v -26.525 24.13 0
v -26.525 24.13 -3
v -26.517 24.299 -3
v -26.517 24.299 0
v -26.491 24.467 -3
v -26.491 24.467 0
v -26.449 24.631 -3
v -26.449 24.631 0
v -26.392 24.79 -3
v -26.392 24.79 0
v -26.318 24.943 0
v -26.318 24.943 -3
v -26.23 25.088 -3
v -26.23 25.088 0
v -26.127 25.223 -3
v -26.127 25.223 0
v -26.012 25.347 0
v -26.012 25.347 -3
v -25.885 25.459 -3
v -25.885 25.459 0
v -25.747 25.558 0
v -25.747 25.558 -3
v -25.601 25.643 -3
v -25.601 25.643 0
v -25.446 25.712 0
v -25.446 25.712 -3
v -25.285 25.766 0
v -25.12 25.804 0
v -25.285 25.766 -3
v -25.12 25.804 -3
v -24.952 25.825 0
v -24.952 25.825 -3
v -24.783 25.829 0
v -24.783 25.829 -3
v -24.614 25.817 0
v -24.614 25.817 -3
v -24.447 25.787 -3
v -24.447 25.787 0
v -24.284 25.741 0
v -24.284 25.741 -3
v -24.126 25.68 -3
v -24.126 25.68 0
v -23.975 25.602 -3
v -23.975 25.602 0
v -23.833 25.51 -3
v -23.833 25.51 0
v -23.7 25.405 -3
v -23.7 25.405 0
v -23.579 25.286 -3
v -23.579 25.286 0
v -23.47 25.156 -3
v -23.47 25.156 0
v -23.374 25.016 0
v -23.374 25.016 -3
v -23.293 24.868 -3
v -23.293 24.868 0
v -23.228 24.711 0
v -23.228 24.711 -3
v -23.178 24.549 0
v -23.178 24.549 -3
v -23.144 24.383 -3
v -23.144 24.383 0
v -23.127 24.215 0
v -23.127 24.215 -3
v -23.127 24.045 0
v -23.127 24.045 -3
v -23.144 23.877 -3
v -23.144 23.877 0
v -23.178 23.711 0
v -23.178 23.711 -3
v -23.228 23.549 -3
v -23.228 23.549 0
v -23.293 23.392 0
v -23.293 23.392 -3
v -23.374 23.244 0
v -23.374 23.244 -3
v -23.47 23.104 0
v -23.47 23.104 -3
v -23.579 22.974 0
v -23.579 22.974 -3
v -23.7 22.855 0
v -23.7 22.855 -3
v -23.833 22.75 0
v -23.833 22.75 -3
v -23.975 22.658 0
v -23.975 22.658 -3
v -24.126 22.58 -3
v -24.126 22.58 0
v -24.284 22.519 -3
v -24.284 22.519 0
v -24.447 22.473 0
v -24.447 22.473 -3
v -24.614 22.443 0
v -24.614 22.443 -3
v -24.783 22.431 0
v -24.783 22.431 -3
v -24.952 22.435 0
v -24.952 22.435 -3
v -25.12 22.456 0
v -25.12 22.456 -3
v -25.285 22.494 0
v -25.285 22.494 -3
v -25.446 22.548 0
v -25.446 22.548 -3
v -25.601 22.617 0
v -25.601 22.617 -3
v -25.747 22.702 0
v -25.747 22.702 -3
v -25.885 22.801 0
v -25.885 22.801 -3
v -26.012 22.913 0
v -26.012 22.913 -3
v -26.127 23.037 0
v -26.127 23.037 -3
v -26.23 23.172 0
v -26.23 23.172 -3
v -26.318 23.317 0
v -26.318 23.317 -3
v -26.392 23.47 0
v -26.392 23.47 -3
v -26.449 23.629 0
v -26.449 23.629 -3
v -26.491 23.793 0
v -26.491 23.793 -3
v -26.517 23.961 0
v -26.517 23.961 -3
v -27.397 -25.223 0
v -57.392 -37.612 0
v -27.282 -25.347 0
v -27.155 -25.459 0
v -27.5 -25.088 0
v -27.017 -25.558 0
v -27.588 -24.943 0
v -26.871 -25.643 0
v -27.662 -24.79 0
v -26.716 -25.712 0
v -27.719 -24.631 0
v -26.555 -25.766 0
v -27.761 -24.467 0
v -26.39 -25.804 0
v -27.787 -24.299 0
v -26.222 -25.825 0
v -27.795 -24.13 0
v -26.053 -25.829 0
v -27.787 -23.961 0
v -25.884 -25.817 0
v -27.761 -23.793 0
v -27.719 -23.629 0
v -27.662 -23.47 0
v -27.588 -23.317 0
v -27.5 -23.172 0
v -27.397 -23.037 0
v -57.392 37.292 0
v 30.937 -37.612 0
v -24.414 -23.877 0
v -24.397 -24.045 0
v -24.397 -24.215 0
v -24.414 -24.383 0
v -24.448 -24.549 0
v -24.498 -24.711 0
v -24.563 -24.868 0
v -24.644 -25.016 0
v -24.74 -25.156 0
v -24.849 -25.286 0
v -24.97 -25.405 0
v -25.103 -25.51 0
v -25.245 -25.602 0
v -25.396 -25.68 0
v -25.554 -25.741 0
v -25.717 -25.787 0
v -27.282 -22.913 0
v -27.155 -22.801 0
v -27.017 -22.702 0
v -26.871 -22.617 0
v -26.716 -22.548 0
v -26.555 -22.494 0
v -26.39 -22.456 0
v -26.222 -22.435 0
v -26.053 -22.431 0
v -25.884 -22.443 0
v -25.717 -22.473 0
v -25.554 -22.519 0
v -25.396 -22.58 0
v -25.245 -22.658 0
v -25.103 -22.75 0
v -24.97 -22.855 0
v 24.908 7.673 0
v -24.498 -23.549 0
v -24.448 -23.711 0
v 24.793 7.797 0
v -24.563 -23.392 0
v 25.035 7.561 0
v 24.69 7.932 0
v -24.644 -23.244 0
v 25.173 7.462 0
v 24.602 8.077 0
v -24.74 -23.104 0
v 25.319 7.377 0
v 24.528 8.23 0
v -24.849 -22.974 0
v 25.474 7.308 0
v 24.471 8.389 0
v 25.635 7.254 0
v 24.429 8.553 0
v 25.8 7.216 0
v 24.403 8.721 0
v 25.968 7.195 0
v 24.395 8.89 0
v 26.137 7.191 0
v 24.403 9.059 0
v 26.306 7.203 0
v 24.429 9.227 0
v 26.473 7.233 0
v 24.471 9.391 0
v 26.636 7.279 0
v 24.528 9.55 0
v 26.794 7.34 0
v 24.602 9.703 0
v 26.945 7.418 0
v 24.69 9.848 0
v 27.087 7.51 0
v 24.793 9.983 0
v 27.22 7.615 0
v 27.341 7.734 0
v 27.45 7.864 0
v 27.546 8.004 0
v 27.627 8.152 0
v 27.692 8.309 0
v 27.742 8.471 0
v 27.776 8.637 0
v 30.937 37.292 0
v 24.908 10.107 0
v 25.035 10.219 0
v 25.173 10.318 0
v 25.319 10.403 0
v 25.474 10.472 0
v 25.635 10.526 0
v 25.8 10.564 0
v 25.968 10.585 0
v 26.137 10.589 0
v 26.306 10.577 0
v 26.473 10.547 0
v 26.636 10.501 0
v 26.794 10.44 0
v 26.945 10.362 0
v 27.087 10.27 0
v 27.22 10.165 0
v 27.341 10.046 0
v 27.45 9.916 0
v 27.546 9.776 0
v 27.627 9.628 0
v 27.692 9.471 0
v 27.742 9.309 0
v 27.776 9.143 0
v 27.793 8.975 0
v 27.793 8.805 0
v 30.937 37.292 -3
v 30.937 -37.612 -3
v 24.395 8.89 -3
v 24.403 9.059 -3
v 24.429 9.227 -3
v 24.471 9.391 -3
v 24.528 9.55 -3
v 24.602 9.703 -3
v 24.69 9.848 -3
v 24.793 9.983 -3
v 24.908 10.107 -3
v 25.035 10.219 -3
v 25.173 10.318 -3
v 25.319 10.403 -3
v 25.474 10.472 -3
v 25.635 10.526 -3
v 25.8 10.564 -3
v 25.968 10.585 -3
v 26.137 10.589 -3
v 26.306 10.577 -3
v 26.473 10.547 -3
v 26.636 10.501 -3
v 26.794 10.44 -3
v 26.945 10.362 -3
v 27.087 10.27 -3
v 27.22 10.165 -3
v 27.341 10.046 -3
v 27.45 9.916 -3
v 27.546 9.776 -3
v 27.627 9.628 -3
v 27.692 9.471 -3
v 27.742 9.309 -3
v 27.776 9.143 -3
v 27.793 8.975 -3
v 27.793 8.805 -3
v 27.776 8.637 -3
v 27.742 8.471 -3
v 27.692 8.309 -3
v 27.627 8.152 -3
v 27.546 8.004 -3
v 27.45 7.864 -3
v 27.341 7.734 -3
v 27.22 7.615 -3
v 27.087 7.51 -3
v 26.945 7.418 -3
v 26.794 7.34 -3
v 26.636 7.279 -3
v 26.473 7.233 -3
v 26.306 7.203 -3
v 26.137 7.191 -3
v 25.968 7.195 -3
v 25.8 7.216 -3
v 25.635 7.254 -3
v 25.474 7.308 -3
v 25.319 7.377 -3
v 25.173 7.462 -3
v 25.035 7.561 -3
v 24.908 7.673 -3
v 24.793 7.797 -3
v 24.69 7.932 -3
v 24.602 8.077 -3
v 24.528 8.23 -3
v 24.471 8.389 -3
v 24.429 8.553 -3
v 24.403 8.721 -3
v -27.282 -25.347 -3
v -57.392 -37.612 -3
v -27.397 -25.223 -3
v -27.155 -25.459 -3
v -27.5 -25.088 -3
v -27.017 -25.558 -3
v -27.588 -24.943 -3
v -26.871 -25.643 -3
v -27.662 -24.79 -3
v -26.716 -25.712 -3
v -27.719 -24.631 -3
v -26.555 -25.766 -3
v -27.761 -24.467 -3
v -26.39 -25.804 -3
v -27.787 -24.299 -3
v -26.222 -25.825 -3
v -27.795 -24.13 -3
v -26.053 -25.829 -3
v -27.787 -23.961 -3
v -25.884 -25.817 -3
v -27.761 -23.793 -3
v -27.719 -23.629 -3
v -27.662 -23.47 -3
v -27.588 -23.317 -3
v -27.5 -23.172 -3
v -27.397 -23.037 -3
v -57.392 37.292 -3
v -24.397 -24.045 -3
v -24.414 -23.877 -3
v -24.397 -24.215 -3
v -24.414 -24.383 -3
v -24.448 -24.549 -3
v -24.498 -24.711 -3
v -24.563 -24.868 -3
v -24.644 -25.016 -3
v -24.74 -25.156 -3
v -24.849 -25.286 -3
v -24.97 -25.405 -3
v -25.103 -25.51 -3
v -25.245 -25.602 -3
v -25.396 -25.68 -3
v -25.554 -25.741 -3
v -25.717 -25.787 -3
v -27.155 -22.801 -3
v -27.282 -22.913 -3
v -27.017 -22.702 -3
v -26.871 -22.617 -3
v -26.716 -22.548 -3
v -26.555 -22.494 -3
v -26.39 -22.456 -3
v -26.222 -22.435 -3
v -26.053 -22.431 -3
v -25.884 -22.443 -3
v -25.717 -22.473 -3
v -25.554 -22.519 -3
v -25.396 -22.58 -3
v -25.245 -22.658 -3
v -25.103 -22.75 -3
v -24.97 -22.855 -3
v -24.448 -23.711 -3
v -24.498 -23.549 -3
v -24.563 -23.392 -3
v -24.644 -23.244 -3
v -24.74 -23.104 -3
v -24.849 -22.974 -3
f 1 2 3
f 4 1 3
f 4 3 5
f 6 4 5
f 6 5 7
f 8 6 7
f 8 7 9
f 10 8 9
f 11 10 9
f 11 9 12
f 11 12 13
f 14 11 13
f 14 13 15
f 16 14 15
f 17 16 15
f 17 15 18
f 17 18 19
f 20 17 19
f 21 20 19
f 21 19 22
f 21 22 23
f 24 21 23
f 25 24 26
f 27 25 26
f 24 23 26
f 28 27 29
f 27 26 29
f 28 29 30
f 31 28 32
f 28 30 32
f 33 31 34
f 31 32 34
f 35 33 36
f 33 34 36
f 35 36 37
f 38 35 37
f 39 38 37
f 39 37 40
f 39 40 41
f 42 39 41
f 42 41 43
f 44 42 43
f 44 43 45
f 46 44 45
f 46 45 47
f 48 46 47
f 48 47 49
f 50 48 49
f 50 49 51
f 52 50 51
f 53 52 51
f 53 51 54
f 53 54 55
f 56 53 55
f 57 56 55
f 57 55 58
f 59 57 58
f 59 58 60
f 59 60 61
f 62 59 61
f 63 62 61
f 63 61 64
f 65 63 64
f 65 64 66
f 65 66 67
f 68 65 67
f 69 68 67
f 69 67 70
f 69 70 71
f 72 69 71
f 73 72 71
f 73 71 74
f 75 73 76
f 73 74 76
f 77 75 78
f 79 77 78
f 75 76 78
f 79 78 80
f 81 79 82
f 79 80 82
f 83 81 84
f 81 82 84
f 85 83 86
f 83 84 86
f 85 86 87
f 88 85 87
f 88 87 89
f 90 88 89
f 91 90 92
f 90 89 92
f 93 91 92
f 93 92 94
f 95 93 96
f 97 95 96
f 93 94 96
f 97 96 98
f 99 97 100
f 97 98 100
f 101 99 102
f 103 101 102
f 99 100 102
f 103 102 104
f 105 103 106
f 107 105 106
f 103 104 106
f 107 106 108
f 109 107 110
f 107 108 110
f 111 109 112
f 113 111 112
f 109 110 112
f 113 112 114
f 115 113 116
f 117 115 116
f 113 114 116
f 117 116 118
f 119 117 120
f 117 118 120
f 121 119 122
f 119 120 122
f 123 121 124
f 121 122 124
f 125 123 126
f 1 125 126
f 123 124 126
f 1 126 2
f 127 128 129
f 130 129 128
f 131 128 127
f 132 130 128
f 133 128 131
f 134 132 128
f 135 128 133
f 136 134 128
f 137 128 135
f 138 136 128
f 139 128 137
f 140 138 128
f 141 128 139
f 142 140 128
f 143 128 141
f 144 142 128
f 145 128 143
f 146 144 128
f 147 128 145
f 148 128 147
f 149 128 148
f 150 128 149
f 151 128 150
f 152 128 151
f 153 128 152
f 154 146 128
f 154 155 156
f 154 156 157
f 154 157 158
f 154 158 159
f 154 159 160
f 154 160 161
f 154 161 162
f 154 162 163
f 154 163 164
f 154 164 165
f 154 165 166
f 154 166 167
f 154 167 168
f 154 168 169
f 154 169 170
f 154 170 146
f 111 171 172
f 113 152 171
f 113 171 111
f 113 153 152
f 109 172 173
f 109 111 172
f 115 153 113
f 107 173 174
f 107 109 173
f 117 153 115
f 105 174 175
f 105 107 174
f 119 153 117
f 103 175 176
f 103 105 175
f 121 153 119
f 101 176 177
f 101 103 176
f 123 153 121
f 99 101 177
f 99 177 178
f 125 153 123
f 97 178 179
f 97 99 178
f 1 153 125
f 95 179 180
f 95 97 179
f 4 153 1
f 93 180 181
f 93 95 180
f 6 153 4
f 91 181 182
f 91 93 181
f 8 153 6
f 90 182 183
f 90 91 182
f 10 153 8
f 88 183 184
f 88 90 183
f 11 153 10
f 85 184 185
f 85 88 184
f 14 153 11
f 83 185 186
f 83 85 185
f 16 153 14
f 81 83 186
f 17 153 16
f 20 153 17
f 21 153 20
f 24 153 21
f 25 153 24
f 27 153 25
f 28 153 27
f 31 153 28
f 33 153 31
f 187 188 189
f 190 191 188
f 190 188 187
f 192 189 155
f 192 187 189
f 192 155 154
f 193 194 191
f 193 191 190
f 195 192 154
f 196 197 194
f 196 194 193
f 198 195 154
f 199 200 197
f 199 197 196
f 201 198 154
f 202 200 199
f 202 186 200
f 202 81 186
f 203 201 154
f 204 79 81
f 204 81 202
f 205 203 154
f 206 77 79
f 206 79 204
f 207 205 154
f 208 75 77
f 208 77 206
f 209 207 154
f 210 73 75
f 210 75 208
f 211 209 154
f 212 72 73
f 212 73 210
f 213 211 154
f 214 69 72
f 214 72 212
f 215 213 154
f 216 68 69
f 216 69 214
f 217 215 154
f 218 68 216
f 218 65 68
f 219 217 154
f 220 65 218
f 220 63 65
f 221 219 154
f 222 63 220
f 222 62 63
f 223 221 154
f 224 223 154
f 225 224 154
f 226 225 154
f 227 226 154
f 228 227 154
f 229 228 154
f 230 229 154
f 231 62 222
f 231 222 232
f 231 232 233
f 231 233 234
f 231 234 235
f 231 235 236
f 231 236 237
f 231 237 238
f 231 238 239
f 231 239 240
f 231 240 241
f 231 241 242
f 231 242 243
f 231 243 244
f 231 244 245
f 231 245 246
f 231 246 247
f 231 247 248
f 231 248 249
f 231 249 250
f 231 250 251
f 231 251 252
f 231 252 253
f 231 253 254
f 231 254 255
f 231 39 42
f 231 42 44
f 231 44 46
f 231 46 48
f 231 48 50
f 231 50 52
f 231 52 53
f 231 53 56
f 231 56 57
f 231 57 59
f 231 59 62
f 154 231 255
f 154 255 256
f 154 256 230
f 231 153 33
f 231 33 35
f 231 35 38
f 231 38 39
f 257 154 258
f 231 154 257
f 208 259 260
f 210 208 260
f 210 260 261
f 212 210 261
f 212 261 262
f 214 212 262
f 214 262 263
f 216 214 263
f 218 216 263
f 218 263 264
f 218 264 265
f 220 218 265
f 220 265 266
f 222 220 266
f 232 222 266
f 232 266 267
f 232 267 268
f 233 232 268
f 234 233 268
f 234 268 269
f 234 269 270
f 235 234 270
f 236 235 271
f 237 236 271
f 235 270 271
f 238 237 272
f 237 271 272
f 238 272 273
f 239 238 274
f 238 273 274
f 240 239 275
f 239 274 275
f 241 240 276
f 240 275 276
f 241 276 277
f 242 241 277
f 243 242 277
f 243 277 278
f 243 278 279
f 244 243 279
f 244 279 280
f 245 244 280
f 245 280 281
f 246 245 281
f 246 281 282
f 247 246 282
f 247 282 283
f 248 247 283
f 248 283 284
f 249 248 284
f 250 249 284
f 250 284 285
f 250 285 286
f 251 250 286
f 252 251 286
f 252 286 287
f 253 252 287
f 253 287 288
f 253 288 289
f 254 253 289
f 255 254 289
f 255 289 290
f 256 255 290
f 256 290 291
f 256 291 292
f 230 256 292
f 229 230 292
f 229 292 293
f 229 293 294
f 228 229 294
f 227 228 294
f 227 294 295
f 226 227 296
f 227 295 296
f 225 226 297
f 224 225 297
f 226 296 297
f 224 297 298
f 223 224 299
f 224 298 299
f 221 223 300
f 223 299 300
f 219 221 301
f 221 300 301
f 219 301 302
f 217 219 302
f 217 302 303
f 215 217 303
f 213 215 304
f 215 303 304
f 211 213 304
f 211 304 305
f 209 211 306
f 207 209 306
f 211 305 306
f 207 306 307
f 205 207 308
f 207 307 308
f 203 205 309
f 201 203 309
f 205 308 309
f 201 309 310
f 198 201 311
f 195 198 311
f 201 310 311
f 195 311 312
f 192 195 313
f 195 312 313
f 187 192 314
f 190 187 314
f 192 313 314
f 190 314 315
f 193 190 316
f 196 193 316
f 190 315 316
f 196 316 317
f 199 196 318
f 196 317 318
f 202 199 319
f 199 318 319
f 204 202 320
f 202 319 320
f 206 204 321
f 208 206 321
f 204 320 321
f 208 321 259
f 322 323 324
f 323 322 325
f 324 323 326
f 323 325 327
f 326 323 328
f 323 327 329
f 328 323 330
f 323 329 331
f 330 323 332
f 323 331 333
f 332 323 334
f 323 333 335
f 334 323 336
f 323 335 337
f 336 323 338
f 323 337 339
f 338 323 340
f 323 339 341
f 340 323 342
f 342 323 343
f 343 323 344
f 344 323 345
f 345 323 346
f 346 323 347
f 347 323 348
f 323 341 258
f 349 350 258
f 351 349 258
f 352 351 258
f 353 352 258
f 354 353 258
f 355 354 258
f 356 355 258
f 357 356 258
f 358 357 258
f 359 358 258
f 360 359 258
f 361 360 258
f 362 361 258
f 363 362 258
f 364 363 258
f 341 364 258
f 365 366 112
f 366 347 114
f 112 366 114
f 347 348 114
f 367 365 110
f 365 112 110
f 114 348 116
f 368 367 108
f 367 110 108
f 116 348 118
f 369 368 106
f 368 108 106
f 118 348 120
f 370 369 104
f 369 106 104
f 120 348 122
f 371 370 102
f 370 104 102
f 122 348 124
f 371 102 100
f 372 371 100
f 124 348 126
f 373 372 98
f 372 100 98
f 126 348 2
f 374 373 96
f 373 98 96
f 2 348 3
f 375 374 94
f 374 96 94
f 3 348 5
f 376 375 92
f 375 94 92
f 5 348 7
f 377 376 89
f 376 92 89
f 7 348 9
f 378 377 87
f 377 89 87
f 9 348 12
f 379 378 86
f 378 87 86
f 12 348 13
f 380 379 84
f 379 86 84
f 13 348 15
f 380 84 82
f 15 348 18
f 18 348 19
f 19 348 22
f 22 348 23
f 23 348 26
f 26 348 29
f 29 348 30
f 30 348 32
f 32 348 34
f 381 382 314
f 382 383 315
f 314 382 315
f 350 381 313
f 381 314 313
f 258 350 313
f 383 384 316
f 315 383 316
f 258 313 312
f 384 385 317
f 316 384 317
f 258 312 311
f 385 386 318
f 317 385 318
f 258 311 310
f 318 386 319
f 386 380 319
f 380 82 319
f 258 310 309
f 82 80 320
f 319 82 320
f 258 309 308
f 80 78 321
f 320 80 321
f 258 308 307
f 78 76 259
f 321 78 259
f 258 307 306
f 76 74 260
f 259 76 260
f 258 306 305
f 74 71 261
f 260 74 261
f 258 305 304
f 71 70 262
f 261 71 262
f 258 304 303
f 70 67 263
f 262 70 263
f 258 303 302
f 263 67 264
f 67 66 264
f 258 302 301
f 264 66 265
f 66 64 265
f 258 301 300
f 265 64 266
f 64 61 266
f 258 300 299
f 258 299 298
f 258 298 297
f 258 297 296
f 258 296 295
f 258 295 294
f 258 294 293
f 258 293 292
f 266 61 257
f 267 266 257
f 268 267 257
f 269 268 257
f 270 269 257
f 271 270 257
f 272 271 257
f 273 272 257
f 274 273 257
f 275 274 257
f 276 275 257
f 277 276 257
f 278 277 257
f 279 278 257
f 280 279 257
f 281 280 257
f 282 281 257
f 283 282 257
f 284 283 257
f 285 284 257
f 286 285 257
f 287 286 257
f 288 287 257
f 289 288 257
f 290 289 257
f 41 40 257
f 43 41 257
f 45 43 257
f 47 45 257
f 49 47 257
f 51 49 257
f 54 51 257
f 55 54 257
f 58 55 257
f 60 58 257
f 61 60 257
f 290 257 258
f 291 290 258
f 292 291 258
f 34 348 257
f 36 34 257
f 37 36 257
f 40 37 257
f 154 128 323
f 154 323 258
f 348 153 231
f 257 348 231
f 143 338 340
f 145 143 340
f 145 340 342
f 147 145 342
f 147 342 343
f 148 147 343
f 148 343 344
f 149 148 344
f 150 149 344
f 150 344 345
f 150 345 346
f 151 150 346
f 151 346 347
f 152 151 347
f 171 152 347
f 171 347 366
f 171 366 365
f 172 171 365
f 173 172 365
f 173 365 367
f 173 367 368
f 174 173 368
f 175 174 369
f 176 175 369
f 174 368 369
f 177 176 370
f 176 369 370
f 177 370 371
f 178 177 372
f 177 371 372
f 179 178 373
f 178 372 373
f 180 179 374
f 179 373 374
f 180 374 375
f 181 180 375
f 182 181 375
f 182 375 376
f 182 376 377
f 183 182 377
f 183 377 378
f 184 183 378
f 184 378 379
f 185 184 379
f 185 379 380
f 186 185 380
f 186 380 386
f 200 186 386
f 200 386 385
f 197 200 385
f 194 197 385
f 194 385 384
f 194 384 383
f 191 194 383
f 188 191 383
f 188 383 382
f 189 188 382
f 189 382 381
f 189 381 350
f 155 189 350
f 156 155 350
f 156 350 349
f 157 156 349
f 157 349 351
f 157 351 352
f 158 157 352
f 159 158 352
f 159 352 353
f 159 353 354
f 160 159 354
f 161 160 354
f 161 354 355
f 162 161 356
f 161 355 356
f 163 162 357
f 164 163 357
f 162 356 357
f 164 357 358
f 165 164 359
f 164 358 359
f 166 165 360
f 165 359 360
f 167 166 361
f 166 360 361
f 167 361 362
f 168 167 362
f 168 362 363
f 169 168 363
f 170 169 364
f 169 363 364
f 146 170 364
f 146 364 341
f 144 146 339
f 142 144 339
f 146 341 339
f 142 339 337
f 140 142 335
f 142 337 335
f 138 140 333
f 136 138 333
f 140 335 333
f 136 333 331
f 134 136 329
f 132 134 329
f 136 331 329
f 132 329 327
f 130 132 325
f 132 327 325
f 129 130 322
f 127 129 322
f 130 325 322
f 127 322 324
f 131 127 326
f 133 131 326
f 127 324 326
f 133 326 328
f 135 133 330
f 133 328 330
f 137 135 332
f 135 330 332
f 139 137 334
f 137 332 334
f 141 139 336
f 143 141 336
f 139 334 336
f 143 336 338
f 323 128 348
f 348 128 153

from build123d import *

# Parameters (mm, degrees)
ESQUISSE1_W        = 88.328603511
ESQUISSE1_H        = 74.903508165
BOSS_EXTRU_1_DEPTH = 3
D_GAGEMENT_M31_D   = 3.4


with BuildPart() as part:
    # Esquisse1 → Boss.-Extru.1 (new body)
    with BuildSketch(Plane.XY):
        with Locations((-13.227677397, -0.159821294)):
            Rectangle(ESQUISSE1_W, ESQUISSE1_H)
    extrude(amount=-BOSS_EXTRU_1_DEPTH)

    # Dégagement M31 (through all)
    with Locations(Plane.XY):
        with Locations((26.095, 8.89), (-24.825, 24.13), (-26.095, -24.13)):
            Hole(D_GAGEMENT_M31_D / 2)


solid = part.part
